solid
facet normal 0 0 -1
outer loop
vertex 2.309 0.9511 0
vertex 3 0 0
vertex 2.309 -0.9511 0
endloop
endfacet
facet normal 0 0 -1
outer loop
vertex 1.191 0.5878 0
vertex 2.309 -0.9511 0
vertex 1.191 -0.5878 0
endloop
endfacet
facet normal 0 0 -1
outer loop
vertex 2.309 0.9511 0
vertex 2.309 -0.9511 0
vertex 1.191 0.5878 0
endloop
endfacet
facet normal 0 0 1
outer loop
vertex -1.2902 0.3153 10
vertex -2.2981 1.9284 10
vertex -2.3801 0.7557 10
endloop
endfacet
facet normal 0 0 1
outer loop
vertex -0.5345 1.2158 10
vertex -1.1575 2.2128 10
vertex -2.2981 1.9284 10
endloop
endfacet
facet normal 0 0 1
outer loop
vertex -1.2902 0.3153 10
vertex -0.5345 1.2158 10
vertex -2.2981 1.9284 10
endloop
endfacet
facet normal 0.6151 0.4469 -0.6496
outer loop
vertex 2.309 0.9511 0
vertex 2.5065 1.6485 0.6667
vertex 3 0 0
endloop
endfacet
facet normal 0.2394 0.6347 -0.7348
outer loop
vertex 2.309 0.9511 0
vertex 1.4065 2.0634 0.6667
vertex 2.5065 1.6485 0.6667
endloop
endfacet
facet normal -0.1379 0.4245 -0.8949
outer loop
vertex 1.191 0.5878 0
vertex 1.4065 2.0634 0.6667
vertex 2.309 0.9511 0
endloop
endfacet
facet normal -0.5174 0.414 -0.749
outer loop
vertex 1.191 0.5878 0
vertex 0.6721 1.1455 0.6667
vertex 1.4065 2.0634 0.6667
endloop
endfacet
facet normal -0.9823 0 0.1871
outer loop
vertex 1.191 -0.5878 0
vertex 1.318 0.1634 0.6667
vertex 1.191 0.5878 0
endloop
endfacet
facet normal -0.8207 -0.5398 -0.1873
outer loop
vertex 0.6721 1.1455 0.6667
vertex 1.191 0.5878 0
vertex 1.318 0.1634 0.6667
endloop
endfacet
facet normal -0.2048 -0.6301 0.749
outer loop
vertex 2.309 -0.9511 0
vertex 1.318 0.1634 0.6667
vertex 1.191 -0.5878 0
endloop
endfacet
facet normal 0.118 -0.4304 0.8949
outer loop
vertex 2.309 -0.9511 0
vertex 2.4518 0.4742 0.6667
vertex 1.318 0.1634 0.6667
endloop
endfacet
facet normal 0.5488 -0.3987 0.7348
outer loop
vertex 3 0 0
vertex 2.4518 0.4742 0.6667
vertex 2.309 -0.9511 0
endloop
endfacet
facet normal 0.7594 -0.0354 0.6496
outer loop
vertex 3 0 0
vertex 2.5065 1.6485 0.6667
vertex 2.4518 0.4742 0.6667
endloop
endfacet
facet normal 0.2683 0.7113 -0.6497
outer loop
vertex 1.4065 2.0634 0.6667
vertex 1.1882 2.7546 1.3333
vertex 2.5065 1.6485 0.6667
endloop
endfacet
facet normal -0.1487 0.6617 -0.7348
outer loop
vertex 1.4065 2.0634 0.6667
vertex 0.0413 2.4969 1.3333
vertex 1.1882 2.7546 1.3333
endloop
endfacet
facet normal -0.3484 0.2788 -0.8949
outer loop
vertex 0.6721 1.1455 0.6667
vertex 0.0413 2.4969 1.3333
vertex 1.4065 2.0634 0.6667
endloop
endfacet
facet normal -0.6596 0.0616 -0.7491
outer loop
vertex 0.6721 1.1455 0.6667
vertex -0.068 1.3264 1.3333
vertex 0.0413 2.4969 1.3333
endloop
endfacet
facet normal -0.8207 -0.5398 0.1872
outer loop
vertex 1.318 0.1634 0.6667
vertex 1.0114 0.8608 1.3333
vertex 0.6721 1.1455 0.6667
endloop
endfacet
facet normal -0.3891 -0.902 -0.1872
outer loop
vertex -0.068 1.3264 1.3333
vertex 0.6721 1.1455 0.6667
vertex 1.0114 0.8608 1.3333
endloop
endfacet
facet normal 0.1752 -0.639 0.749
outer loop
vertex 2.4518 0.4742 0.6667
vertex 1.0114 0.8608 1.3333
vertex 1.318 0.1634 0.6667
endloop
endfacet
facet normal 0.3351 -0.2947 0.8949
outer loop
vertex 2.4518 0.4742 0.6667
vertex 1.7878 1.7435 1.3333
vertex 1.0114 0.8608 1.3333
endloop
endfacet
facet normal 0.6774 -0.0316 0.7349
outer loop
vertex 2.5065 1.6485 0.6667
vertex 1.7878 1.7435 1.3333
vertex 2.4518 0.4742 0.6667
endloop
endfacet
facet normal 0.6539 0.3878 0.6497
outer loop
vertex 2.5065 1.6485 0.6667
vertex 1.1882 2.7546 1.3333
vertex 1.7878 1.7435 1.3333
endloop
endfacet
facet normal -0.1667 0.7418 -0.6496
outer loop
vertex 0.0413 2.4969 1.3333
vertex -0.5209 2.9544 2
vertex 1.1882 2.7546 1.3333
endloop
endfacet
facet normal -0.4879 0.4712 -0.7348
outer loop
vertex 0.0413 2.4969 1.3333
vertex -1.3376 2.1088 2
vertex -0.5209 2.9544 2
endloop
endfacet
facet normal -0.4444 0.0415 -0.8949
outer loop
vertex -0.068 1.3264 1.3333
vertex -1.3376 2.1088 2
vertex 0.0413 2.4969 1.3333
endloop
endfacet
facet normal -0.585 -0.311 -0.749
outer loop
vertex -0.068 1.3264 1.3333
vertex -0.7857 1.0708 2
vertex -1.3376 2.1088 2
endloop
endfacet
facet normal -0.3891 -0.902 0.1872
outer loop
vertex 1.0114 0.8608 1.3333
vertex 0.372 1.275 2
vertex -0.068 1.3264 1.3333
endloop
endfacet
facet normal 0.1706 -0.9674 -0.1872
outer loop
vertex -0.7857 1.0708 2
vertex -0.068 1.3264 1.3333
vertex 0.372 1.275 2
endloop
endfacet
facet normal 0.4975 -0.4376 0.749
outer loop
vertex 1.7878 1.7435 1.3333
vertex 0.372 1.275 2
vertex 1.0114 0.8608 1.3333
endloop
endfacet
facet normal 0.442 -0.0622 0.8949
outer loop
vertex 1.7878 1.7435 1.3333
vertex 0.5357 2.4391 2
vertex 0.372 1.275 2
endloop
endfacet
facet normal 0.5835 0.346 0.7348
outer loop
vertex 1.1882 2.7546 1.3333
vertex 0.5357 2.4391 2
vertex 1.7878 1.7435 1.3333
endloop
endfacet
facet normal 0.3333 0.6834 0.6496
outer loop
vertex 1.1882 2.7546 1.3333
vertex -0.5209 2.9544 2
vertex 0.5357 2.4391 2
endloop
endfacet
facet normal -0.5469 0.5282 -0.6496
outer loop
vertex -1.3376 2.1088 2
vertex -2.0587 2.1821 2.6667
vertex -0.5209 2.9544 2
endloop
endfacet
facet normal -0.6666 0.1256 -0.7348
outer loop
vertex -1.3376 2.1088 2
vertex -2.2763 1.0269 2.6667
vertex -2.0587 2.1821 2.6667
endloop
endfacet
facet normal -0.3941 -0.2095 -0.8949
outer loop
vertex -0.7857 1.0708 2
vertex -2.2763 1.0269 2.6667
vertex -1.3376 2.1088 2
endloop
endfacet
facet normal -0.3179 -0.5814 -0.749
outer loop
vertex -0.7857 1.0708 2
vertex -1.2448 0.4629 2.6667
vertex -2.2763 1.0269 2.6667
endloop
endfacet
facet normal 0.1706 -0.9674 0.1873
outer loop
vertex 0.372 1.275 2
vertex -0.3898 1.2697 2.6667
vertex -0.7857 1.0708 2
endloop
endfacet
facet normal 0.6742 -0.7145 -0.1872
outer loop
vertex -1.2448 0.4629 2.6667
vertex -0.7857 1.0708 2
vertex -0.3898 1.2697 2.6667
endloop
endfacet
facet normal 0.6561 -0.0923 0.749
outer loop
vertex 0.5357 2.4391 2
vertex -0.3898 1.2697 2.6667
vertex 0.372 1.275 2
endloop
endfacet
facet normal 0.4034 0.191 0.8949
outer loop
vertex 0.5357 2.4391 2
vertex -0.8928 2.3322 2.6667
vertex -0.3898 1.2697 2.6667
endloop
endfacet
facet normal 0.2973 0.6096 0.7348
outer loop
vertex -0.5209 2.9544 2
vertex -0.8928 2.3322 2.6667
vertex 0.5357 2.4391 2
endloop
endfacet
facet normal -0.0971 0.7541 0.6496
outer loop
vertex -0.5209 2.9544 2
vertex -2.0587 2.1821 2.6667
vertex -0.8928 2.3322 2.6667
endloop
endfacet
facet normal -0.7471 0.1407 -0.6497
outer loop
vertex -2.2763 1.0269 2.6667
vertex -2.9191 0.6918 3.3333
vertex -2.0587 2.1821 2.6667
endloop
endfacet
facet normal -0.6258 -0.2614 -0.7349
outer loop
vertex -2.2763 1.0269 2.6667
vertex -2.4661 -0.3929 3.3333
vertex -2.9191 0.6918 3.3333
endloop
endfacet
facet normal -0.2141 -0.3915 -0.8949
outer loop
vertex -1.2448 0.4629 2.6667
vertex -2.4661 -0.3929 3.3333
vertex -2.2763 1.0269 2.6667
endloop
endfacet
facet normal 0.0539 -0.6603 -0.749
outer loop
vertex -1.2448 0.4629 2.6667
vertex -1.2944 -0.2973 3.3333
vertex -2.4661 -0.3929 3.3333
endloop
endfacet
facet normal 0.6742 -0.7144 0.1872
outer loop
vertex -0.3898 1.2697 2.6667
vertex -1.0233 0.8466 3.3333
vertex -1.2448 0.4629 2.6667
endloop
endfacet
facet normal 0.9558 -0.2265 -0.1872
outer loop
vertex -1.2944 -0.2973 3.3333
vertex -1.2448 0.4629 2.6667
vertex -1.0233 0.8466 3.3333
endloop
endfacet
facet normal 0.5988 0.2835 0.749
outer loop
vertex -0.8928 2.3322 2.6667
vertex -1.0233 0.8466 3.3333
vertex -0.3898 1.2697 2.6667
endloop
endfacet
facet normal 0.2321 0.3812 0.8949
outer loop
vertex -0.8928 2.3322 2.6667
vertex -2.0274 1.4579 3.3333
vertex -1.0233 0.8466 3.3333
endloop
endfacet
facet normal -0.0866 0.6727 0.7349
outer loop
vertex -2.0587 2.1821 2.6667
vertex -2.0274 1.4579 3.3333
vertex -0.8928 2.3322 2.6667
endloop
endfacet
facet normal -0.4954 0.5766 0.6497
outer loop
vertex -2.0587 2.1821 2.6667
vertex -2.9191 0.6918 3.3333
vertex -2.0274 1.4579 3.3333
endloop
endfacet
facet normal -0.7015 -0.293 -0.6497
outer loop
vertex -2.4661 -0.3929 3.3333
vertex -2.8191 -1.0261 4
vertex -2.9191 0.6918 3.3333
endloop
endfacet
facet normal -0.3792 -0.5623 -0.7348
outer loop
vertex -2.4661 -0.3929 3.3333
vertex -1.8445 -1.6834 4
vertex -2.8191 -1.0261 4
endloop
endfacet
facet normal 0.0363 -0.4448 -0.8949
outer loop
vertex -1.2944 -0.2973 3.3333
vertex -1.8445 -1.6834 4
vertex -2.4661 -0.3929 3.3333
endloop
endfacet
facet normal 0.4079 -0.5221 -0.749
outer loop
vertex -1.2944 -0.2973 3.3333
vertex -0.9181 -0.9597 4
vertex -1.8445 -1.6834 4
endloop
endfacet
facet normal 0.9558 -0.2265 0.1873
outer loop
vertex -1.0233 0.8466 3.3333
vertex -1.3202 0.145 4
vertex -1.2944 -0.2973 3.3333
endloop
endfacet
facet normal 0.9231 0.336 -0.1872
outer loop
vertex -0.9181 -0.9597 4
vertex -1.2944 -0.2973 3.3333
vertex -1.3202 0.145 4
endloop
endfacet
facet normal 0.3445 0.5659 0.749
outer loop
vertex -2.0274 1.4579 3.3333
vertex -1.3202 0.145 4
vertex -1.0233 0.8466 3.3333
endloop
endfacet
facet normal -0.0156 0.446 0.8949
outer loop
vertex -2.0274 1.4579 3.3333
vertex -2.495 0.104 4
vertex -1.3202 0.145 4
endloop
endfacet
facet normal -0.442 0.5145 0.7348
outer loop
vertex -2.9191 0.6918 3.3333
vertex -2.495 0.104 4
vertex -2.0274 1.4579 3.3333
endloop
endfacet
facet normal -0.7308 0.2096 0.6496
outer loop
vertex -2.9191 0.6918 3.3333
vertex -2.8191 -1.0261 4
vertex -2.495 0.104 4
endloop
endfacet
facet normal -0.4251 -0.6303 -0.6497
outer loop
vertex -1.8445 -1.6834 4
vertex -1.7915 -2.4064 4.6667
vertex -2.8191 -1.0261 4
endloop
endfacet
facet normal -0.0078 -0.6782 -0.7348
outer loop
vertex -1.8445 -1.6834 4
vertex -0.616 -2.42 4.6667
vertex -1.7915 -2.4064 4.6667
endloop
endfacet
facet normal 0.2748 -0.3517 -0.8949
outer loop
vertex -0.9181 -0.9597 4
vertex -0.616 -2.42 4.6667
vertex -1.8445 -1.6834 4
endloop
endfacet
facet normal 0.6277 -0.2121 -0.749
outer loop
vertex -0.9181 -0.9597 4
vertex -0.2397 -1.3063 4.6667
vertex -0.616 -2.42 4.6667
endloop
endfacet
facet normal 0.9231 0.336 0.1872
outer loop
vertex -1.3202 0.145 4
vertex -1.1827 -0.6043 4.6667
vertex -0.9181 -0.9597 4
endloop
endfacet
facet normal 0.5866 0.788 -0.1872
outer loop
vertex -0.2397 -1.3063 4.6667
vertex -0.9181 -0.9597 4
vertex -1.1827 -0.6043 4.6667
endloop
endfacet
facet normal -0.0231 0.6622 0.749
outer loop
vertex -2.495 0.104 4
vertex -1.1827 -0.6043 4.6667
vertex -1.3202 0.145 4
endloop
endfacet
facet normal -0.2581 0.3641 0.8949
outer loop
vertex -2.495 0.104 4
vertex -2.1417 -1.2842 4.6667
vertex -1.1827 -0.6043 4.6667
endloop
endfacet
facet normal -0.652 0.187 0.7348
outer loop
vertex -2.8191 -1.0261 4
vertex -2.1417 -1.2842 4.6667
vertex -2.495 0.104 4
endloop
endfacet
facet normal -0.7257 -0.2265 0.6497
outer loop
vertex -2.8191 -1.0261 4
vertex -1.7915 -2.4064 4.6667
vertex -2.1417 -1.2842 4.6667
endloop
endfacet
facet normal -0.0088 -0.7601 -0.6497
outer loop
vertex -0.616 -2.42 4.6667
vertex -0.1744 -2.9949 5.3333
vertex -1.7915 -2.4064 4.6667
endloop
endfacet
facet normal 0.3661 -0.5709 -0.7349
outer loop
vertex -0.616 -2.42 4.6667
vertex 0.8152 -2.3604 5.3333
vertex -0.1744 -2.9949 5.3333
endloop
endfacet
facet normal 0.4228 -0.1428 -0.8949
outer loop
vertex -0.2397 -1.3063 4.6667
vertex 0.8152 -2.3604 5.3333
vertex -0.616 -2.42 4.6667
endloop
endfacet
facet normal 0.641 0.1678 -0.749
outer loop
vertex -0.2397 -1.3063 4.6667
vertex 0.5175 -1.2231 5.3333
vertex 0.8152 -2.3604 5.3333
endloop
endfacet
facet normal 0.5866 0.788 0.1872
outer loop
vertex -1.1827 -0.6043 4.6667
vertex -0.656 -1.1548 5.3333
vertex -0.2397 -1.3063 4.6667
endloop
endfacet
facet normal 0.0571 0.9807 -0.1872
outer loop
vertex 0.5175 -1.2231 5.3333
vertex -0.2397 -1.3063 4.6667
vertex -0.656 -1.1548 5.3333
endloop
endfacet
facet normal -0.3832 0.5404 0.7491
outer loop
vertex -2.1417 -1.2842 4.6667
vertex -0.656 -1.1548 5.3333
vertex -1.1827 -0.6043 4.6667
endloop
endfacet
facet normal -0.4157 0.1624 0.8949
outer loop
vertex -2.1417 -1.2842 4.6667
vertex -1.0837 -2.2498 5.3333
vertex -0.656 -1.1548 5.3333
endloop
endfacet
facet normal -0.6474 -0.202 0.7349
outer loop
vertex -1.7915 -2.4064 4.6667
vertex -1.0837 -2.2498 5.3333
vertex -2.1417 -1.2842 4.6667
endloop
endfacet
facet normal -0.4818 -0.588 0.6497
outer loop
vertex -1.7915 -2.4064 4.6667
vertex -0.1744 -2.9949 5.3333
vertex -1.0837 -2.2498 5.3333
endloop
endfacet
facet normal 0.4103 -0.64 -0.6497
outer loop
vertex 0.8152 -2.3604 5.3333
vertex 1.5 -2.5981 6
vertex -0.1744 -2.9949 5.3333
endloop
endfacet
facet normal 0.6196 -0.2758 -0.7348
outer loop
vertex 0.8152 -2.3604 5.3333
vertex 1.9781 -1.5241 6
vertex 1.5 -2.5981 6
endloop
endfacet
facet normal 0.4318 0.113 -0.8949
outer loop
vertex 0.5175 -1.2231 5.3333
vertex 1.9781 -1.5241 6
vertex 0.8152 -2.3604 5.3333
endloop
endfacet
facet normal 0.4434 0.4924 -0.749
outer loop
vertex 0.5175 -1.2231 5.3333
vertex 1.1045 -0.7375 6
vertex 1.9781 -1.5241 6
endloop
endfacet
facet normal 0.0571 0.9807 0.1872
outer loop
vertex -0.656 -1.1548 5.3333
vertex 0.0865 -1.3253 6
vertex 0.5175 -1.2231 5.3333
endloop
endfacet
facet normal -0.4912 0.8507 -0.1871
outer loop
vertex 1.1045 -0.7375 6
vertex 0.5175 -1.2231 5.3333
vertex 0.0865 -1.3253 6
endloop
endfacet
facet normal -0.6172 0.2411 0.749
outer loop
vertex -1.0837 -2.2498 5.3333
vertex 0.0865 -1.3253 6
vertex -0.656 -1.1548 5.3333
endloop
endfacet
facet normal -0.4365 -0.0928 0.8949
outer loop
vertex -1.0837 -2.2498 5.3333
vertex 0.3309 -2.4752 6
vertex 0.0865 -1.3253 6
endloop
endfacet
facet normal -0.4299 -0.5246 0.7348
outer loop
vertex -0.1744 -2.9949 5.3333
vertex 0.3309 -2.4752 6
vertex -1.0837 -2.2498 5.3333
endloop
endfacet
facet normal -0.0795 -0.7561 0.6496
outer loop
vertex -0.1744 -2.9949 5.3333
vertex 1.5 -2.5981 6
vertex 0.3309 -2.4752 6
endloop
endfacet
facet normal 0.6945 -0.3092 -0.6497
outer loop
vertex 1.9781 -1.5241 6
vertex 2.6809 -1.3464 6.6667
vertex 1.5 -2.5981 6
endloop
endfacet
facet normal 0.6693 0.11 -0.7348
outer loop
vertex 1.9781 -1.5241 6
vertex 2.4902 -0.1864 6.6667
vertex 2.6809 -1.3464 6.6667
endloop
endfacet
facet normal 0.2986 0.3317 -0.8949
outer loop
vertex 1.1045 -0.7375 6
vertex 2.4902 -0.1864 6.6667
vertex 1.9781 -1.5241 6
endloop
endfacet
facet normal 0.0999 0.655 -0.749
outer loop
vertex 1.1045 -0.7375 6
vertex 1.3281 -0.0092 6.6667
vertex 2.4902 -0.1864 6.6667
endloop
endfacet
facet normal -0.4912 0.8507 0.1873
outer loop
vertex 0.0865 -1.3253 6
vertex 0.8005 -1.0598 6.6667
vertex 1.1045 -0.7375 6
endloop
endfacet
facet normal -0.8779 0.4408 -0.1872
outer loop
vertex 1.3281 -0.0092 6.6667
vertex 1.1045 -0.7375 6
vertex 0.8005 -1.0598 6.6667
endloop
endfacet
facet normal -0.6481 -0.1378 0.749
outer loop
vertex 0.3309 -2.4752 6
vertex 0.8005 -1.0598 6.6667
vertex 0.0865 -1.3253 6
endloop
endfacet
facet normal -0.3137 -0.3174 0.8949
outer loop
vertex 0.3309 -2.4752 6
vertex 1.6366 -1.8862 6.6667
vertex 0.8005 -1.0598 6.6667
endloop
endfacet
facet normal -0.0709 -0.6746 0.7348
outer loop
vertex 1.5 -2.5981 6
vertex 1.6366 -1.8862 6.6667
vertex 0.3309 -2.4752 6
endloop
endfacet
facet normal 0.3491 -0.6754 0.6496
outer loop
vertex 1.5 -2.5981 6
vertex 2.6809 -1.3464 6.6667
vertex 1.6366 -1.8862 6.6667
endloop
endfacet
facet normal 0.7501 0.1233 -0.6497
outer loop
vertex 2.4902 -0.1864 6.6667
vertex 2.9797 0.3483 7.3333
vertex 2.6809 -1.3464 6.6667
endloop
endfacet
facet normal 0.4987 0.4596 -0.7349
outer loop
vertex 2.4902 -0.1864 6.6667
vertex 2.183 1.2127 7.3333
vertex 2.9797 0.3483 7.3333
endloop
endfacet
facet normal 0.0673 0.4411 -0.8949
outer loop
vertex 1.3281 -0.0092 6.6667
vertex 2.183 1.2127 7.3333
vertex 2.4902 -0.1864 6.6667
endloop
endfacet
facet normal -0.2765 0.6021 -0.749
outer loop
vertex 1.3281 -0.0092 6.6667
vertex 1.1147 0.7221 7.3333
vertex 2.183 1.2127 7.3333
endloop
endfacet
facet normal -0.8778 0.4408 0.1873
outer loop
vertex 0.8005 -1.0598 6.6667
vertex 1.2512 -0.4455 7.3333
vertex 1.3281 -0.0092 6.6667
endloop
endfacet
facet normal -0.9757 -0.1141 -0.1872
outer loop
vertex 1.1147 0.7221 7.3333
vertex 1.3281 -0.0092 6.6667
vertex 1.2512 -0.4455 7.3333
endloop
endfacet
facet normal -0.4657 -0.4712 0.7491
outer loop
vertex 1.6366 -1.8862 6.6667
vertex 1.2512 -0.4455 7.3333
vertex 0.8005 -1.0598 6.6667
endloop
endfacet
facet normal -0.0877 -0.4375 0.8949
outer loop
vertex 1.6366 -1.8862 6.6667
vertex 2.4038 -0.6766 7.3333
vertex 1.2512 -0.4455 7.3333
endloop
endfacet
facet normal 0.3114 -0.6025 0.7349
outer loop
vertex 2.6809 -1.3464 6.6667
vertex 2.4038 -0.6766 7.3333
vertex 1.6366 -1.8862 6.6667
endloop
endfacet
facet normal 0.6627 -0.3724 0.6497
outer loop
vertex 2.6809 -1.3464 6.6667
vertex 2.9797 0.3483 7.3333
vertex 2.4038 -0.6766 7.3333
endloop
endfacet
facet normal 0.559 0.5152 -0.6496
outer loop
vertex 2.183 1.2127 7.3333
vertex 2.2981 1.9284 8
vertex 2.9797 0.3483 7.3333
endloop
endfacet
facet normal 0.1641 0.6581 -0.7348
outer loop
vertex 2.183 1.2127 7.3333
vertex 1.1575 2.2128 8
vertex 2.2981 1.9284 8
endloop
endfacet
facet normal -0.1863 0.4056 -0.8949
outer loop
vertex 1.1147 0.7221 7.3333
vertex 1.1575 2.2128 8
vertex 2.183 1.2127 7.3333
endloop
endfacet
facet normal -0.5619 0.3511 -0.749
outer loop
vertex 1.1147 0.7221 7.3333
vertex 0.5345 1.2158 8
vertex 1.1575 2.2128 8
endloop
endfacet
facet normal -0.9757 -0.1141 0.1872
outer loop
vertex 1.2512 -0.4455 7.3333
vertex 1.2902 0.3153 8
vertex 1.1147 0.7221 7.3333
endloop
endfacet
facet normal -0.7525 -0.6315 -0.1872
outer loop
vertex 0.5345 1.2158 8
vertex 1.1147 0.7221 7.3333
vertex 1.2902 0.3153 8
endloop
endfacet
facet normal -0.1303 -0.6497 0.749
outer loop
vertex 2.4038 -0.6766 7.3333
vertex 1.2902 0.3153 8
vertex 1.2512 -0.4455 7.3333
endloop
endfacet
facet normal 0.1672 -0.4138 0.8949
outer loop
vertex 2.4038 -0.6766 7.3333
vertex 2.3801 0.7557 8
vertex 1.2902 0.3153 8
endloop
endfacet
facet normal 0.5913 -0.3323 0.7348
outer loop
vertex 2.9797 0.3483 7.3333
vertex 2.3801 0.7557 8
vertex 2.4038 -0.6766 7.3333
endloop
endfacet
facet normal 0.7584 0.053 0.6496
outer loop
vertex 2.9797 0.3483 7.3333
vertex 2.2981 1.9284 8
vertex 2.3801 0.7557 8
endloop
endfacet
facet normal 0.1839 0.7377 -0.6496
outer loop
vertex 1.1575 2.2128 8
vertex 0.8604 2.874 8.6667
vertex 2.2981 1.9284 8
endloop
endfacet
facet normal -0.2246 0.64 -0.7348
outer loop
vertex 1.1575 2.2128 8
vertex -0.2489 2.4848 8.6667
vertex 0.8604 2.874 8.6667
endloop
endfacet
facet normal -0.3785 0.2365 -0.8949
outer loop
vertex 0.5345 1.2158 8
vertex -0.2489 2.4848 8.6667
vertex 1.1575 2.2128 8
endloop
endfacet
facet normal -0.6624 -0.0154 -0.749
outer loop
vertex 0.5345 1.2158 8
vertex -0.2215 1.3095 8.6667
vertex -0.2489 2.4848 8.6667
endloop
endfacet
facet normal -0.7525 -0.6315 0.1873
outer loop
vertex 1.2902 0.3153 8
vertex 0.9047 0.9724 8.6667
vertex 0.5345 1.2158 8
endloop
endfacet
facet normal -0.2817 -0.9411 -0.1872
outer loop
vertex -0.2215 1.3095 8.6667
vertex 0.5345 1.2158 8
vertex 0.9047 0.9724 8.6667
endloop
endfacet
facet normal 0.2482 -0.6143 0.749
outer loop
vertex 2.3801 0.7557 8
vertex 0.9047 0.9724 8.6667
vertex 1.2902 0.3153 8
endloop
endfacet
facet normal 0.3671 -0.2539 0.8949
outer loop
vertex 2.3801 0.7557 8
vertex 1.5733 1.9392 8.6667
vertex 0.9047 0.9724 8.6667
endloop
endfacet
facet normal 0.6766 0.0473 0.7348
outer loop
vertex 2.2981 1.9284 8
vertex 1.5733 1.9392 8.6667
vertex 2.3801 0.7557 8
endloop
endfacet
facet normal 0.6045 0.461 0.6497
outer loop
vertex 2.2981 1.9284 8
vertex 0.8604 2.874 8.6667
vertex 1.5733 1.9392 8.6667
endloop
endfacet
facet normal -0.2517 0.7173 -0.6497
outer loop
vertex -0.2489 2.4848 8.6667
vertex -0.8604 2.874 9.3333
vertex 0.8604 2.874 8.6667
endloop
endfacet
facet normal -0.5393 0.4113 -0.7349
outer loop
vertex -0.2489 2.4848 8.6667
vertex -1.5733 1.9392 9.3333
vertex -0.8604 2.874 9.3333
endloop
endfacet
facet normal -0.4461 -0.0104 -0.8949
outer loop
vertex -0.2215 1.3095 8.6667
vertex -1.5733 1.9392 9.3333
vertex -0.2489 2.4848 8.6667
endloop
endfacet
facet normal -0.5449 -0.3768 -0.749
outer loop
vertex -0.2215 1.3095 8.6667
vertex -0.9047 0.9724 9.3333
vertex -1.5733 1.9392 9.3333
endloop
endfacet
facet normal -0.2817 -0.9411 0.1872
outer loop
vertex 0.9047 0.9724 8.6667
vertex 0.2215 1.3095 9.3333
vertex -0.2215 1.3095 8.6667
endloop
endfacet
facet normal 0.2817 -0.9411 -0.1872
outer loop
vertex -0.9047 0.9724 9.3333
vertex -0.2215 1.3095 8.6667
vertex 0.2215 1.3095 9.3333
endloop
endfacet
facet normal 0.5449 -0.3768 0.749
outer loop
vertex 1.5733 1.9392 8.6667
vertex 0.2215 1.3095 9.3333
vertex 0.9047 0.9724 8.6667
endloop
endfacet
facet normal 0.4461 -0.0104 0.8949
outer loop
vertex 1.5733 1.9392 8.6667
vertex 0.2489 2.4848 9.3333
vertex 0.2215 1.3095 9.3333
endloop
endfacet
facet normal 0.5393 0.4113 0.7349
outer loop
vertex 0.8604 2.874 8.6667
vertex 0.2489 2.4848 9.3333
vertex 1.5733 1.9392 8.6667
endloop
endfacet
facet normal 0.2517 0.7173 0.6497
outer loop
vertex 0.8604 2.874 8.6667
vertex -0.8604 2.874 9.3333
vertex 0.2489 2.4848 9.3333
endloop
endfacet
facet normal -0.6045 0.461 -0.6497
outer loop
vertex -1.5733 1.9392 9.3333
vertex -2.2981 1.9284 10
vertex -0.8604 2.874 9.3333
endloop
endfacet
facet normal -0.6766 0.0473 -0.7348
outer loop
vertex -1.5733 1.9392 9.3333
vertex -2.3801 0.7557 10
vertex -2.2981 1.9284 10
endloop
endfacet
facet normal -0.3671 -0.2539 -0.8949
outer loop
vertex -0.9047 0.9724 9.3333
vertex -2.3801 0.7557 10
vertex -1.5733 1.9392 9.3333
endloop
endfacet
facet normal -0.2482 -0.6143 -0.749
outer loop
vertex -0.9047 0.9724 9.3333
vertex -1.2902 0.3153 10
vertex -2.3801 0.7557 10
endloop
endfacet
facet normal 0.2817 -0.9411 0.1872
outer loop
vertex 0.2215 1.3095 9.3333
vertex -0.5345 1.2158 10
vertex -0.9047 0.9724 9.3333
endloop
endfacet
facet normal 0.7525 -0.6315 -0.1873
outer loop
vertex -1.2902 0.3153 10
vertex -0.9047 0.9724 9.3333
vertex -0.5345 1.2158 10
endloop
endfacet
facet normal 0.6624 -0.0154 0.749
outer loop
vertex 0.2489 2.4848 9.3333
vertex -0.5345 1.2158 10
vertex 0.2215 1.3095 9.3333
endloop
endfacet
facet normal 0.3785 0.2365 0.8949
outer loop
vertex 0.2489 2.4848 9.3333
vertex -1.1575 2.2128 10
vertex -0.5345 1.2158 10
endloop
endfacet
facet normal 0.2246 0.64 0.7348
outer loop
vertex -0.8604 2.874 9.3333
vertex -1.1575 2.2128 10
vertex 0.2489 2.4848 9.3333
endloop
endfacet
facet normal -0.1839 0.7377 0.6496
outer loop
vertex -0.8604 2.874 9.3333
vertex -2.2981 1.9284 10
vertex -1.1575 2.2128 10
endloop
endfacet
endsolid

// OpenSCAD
// Unit of length: Unit.MM
linear_extrude(height = 10.0, center = false, convexity = 10, twist = -500.0, scale = 1.0)
{
   translate(v = [2.0, 0.0])
   {
      circle(d = 2.0);
   }
}
